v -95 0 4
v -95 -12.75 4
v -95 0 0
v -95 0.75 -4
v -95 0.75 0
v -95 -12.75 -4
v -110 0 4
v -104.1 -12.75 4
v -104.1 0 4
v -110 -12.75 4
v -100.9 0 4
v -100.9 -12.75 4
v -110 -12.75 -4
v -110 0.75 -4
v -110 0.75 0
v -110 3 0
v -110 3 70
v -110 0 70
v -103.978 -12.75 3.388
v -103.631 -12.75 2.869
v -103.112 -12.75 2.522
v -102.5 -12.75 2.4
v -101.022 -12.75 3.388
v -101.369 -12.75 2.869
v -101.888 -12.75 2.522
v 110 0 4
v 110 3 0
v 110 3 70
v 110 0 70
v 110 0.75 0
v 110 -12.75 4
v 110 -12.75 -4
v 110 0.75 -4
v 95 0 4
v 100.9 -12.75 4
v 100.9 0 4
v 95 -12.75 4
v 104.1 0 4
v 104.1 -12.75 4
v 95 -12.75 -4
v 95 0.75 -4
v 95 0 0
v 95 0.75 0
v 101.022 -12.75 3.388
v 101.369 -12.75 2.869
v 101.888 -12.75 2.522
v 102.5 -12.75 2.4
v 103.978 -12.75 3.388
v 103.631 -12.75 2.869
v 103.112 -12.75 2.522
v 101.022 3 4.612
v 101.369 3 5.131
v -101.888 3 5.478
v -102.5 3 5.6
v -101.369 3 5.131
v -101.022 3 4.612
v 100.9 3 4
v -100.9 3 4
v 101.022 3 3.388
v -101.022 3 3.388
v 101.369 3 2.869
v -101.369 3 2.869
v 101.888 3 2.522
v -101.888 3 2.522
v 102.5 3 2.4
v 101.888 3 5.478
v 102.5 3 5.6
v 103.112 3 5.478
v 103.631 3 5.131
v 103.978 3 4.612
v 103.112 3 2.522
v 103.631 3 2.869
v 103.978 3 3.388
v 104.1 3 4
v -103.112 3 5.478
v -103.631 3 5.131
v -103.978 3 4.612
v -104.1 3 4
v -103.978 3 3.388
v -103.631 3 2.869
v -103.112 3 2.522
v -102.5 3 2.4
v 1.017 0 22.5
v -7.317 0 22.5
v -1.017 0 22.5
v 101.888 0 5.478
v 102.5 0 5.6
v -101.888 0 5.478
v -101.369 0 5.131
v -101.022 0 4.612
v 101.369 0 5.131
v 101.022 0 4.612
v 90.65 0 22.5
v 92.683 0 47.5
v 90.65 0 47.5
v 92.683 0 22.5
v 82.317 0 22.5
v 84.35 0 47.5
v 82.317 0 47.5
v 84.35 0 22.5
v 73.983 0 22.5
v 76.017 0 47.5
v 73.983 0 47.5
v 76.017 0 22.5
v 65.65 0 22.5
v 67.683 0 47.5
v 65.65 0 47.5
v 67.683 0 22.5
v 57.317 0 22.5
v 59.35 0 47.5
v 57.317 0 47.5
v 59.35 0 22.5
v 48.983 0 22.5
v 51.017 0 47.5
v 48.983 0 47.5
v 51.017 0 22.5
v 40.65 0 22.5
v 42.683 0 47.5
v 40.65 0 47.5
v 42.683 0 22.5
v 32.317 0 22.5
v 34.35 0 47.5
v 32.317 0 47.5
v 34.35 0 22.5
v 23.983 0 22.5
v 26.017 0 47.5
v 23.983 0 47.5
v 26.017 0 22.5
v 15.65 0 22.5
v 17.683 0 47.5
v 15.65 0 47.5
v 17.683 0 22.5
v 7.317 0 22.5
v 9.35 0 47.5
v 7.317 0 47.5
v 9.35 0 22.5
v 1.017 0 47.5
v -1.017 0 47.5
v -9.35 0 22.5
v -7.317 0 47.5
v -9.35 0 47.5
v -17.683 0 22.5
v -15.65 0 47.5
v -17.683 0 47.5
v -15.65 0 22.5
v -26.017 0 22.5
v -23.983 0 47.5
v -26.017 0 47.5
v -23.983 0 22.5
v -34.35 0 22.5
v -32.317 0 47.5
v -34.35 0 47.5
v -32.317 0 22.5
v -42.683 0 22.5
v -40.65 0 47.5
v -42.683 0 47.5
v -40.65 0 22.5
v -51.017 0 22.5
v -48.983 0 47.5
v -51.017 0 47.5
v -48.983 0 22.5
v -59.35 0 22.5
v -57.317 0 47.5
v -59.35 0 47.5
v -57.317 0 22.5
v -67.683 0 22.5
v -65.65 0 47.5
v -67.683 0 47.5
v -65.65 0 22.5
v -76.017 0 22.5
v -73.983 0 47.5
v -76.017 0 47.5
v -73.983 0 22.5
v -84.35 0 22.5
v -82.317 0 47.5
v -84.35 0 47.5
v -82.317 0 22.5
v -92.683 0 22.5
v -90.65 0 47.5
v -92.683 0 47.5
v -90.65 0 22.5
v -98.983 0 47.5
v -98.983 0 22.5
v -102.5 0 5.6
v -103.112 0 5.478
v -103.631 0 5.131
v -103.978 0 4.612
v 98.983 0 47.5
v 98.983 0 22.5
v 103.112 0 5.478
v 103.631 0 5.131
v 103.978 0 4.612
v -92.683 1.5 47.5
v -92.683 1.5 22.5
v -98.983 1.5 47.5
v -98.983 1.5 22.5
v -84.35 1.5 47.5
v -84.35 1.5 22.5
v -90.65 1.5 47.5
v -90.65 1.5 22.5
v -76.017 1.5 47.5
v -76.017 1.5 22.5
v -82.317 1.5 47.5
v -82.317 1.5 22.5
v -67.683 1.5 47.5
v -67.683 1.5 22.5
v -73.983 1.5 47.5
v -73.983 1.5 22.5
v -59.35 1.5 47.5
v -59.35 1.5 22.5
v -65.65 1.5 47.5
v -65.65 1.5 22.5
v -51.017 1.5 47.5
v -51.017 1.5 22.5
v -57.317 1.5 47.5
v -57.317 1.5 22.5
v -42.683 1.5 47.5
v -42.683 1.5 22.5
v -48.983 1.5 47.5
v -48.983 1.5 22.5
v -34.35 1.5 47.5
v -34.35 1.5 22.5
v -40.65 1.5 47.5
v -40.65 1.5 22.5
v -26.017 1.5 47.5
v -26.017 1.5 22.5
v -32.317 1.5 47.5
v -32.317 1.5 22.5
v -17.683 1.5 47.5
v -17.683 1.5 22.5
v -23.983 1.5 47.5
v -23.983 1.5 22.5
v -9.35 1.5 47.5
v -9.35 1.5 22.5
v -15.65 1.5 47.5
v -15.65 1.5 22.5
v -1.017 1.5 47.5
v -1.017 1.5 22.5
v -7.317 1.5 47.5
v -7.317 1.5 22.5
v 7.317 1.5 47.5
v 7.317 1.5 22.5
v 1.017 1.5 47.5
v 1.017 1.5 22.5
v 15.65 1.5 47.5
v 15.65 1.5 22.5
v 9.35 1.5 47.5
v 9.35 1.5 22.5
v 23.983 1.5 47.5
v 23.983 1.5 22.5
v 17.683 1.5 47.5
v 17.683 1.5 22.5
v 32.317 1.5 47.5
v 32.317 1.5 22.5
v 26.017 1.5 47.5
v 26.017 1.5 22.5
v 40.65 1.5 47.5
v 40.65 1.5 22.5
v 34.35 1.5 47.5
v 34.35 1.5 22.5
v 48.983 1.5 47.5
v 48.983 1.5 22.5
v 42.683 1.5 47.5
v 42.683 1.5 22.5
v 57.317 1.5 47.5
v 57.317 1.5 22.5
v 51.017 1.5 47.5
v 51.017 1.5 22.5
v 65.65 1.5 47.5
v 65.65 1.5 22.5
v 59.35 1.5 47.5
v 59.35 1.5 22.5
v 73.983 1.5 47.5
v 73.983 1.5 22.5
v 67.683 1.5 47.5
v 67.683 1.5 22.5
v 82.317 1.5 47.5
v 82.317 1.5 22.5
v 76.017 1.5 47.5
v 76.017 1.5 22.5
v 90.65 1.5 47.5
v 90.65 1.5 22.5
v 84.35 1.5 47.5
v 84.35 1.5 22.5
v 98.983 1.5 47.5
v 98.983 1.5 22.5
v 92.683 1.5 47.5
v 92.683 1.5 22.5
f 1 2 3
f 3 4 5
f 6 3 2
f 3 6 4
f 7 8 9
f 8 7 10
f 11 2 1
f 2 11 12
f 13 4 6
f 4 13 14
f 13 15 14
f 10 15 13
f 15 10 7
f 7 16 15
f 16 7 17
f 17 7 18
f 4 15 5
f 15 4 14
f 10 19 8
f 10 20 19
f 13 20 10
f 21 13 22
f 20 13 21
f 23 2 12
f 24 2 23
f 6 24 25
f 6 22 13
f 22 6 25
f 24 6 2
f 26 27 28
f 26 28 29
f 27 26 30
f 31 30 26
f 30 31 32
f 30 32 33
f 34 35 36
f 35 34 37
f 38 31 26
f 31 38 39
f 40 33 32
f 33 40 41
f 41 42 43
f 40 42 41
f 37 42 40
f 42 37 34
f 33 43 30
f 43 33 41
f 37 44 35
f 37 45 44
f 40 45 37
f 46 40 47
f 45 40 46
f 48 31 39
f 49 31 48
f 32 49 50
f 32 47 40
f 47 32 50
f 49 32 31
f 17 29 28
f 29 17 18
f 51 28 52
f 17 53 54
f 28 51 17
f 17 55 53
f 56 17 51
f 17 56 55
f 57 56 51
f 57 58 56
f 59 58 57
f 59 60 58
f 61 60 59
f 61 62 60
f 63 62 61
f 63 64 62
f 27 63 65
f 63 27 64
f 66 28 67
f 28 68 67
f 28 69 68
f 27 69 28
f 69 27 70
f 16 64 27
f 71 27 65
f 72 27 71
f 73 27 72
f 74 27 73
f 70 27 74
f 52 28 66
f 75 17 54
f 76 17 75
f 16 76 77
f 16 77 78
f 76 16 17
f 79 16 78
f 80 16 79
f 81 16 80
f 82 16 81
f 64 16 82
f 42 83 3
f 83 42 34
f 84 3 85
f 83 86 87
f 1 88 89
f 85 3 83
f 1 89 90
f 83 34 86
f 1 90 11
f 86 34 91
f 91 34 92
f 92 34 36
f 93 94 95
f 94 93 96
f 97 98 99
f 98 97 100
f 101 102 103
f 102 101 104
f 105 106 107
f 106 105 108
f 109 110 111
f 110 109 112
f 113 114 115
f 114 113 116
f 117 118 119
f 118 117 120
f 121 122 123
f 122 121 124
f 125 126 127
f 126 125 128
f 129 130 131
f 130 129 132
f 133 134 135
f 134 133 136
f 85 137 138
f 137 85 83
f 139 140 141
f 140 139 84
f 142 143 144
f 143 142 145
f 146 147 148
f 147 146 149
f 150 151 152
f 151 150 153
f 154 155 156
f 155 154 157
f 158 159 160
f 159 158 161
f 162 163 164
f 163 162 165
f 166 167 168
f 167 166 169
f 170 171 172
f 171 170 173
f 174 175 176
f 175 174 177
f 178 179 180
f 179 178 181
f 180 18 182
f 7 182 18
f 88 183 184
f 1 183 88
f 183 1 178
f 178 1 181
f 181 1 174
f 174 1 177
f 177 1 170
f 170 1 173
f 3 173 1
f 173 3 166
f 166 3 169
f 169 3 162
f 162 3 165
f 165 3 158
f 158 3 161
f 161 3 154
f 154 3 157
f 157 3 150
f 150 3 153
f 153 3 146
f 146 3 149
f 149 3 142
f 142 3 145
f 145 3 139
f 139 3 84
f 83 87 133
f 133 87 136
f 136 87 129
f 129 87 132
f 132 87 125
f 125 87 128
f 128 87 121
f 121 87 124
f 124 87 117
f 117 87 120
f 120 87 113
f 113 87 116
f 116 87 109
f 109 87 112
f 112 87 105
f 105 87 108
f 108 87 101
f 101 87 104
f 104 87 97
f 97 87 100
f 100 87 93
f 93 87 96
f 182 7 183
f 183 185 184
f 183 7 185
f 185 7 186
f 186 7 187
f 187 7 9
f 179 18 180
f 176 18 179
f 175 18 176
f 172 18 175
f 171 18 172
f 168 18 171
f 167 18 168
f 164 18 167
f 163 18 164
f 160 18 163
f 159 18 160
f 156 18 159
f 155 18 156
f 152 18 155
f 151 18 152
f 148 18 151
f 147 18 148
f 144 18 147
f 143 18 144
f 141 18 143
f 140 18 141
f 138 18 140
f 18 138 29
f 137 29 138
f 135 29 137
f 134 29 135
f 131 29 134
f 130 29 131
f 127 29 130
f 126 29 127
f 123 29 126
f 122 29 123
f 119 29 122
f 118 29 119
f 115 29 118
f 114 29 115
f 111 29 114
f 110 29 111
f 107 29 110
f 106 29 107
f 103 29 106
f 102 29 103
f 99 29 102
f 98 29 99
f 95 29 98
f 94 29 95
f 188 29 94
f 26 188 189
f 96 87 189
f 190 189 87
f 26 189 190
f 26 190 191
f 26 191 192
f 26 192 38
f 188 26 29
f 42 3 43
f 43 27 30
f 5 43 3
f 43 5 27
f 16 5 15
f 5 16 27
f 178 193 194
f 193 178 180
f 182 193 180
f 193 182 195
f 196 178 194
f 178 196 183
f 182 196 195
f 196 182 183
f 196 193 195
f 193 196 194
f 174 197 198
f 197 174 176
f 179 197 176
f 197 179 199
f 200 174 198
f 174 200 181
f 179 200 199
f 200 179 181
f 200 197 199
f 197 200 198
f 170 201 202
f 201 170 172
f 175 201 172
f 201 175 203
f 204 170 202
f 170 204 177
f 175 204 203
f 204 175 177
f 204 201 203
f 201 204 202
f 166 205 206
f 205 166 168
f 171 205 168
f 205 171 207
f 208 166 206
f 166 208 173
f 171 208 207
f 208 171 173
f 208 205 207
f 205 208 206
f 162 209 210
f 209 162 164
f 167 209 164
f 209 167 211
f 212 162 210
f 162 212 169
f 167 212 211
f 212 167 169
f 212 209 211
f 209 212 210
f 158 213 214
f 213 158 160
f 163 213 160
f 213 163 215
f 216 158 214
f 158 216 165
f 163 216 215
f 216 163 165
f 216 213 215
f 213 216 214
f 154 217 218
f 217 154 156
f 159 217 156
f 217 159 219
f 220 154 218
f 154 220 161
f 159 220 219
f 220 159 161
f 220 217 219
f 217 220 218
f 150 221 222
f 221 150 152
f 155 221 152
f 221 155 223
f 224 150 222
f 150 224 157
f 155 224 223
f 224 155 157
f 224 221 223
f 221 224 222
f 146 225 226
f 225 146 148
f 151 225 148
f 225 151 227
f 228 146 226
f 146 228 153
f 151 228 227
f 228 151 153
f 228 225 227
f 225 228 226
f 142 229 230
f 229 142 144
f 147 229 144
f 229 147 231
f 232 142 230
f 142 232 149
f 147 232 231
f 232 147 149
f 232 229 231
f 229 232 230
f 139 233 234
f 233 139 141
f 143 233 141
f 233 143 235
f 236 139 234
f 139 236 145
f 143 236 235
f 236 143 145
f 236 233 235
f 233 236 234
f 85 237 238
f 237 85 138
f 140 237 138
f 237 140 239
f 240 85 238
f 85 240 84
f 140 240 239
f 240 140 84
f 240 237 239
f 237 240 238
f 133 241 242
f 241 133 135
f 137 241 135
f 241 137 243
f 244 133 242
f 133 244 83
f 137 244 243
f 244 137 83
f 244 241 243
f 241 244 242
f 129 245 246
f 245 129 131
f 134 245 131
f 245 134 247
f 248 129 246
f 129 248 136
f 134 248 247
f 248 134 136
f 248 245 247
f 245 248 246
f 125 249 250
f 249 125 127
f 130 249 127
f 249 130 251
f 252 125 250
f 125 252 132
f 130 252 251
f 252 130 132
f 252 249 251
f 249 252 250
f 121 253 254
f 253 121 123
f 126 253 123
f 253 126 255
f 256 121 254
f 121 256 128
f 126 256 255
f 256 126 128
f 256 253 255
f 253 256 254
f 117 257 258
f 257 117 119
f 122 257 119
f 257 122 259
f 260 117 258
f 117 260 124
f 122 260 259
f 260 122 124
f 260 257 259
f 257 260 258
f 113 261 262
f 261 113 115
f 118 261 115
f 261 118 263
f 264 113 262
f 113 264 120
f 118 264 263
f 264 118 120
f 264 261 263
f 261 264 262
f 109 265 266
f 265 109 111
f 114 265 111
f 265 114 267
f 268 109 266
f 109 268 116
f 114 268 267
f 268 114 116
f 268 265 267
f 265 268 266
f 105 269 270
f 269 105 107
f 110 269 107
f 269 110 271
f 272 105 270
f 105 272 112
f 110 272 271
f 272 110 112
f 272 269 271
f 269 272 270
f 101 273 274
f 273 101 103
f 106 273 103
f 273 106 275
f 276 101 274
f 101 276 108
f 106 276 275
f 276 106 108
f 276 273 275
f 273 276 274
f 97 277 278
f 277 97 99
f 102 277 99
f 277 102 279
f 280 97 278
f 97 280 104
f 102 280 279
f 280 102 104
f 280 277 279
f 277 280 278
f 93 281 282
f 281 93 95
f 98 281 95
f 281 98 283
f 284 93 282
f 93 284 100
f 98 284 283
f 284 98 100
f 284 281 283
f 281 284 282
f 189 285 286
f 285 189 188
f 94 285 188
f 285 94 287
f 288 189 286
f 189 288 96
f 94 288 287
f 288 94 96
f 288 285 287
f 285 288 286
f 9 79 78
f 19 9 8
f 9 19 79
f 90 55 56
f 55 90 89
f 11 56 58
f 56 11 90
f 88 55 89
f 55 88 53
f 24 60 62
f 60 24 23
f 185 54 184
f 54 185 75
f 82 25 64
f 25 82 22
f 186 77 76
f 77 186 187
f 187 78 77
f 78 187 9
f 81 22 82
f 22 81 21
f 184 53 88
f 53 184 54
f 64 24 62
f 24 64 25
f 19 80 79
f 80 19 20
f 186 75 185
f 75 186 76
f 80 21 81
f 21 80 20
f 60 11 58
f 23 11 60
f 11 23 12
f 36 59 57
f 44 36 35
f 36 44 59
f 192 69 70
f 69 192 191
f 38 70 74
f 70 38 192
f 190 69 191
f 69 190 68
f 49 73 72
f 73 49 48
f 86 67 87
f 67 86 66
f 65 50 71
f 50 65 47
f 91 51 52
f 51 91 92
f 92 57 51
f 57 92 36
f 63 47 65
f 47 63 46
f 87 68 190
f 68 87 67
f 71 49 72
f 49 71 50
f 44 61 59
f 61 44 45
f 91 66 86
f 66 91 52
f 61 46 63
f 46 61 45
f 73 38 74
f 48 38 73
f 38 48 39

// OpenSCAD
// file: ../common.scad
/*
 * WAVE OCEAN V10 - TWISTED CAM SYSTEM
 * COMMON PARAMETERS
 *
 * Simplified mechanism: slats rest on cam surface, no follower arms
 * Single helical ridge creates traveling wave as cam rotates
 *
 * All dimensions in mm
 */

// ============================================
// PRINT TOLERANCES (tune for your printer)
// ============================================

TOL_CLEARANCE = 0.2;         // Shaft in hole clearance
TOL_PRESS_FIT = -0.15;       // Bearing press-fit interference
TOL_SLIDING = 0.3;           // Sliding fit (slats in guides)

// ============================================
// HARDWARE - BEARINGS
// ============================================

// 608 bearing (main shaft) - common, cheap
BEARING_608_ID = 8;
BEARING_608_OD = 22;
BEARING_608_H = 7;

// ============================================
// HARDWARE - FASTENERS
// ============================================

M3_HOLE = 3.2;
M3_HEAD_DIA = 5.5;
M3_HEAD_H = 3;
M4_HOLE = 4.2;

// ============================================
// MAIN SHAFT
// ============================================

SHAFT_DIA = 8;                   // 8mm steel rod
SHAFT_LENGTH = 260;              // Total shaft length
SHAFT_HOLE = SHAFT_DIA + TOL_CLEARANCE;  // 8.2mm

// ============================================
// TWISTED CAM DIMENSIONS
// ============================================

CAM_LENGTH = 200;                // Active wave zone
CAM_CORE_RADIUS = 12;            // Base cylinder radius
CAM_RIDGE_HEIGHT = 10;           // How much ridge sticks out
CAM_RIDGE_WIDTH = 8;             // Width of ridge (smoothness)
CAM_MAX_RADIUS = CAM_CORE_RADIUS + CAM_RIDGE_HEIGHT;  // 22mm

// Helix parameters
HELIX_TURNS = 2;                 // Number of complete spirals
HELIX_PITCH = CAM_LENGTH / HELIX_TURNS;  // 100mm per turn

// ============================================
// SLAT DIMENSIONS
// ============================================

NUM_SLATS = 24;
SLAT_SPACING = CAM_LENGTH / NUM_SLATS;  // 8.33mm

SLAT_WIDTH = 6;                  // X dimension (along cam axis)
SLAT_DEPTH = 30;                 // Y dimension (front to back)
SLAT_HEIGHT = 50;                // Z dimension (wave visual height)

// Slat bottom - curved to nest on cam surface
SLAT_CURVE_RADIUS = CAM_CORE_RADIUS + 2;  // Slightly larger than core

// Wave motion
WAVE_AMPLITUDE = CAM_RIDGE_HEIGHT;  // Total Z travel = ridge height

// ============================================
// GUIDE RAIL DIMENSIONS
// ============================================

// Minimal guides - thin vertical slots, barely visible
GUIDE_LENGTH = CAM_LENGTH + 20;  // 220mm
GUIDE_HEIGHT = WAVE_AMPLITUDE + SLAT_HEIGHT + 10;  // 70mm
GUIDE_THICKNESS = 3;             // Very thin - minimal visual impact
GUIDE_WALL = 2;

SLOT_WIDTH = SLAT_WIDTH + TOL_SLIDING;  // 6.3mm
SLOT_HEIGHT = WAVE_AMPLITUDE + 15;       // 25mm vertical travel

// ============================================
// BEARING BLOCK DIMENSIONS
// ============================================

BB_WIDTH = 30;
BB_DEPTH = 30;
BB_HEIGHT = CAM_MAX_RADIUS + 8;  // 30mm - cam clears base

BEARING_POCKET_DIA = BEARING_608_OD - TOL_PRESS_FIT;  // 22.15mm press fit
BEARING_POCKET_DEPTH = BEARING_608_H + 0.5;           // 7.5mm

// ============================================
// BASE PLATE DIMENSIONS
// ============================================

BASE_LENGTH = CAM_LENGTH + 60;   // 260mm
BASE_WIDTH = SLAT_DEPTH + 40;    // 70mm
BASE_THICKNESS = 5;

// ============================================
// ASSEMBLY POSITIONS
// ============================================

// Cam center Z (shaft axis height above base)
CAM_CENTER_Z = BASE_THICKNESS + BB_HEIGHT;  // 35mm

// Bearing blocks X positions
BB_LEFT_X = -CAM_LENGTH/2 - BB_WIDTH/2 - 5;   // -120mm
BB_RIGHT_X = CAM_LENGTH/2 + BB_WIDTH/2 + 5;   // +120mm

// Guide rails Y positions (front and back of slats)
GUIDE_FRONT_Y = -SLAT_DEPTH/2 - GUIDE_THICKNESS - 1;  // -17mm
GUIDE_BACK_Y = SLAT_DEPTH/2 + 1;                       // +16mm

// Guide rails Z position (bottom of guide)
GUIDE_Z = CAM_CENTER_Z + CAM_MAX_RADIUS - 5;  // 52mm

// ============================================
// COLORS
// ============================================

C_CAM = [0.7, 0.5, 0.25];        // Wood brown
C_SLAT = [0.15, 0.35, 0.6];      // Ocean blue
C_GUIDE = [0.3, 0.3, 0.35, 0.5]; // Dark gray, semi-transparent
C_BB = [0.35, 0.35, 0.4];        // Bearing block gray
C_BASE = [0.25, 0.25, 0.3];      // Dark base
C_SHAFT = [0.6, 0.6, 0.65];      // Steel

// ============================================
// HELPER FUNCTIONS
// ============================================

// Helix phase at position X along cam (0-360 per turn)
function helix_phase(x) = ((x + CAM_LENGTH/2) / CAM_LENGTH) * 360 * HELIX_TURNS;

// Cam surface height at position X, given cam rotation angle theta
// Returns how far the ridge sticks up at that X position
function ridge_height(x, theta) =
    let(phase = helix_phase(x) + theta)
    let(ridge = CAM_RIDGE_HEIGHT * max(0, cos(phase - 90)))
    ridge;

// Total cam radius at position X, angle theta
function cam_radius(x, theta) = CAM_CORE_RADIUS + ridge_height(x, theta);

// Slat X position (evenly spaced)
function slat_x(i) = i * SLAT_SPACING - CAM_LENGTH/2 + SLAT_SPACING/2;

// Slat Z position (bottom of slat rests on cam surface)
function slat_z(i, theta) =
    let(x = slat_x(i))
    CAM_CENTER_Z + cam_radius(x, theta);

// ============================================
// QUALITY
// ============================================

$fn = 48;

// ============================================
// VERIFICATION
// ============================================

echo("=== TWISTED CAM SYSTEM ===");
echo(str("Cam length: ", CAM_LENGTH, "mm"));
echo(str("Cam radius: ", CAM_CORE_RADIUS, "-", CAM_MAX_RADIUS, "mm"));
echo(str("Ridge height (wave amplitude): ", CAM_RIDGE_HEIGHT, "mm"));
echo(str("Helix turns: ", HELIX_TURNS));
echo(str("Slats: ", NUM_SLATS, " @ ", SLAT_SPACING, "mm spacing"));
echo(str("Slat gap: ", SLAT_SPACING - SLAT_WIDTH, "mm"));
// main file
/*
 * GUIDE RAIL - Minimal Vertical Slot Guide
 *
 * Printable part: 2x (front and back)
 * Print orientation: Flat on side
 *
 * Features:
 * - Very thin profile to minimize visual impact
 * - 24 vertical slots for slats to slide in
 * - Mounting tabs at ends
 * - Designed to be nearly invisible when viewing waves
 */

include <../common.scad>

$fn = 32;

// ============================================
// MAIN GUIDE RAIL MODULE
// ============================================

module guide_rail() {
    difference() {
        union() {
            // Main rail body
            rail_body();

            // Mounting tabs at ends
            mounting_tabs();
        }

        // Vertical slots for slats
        slat_slots();

        // Mounting screw holes
        mounting_holes();
    }
}

// ============================================
// RAIL BODY
// ============================================

module rail_body() {
    // Very thin bar with rounded edges
    translate([-GUIDE_LENGTH/2, 0, 0])
    hull() {
        translate([0, 0, 0])
            cube([GUIDE_LENGTH, GUIDE_THICKNESS, 1]);
        translate([0, 0, GUIDE_HEIGHT - 1])
            cube([GUIDE_LENGTH, GUIDE_THICKNESS, 1]);
    }
}

// ============================================
// MOUNTING TABS
// ============================================

module mounting_tabs() {
    tab_width = 15;
    tab_depth = 12;
    tab_height = 8;

    for (x_sign = [-1, 1]) {
        translate([x_sign * (GUIDE_LENGTH/2 - tab_width/2), -tab_depth/2, 0])
            cube([tab_width, tab_depth + GUIDE_THICKNESS/2, tab_height], center = true);
    }
}

// ============================================
// SLAT SLOTS
// ============================================

module slat_slots() {
    // Vertical slots that slats slide through
    // Sized for SLAT_WIDTH + tolerance

    for (i = [0 : NUM_SLATS - 1]) {
        x = slat_x(i);

        // Through slot
        translate([x, -1, GUIDE_HEIGHT/2])
            cube([SLOT_WIDTH, GUIDE_THICKNESS + 2, SLOT_HEIGHT], center = true);
    }
}

// ============================================
// MOUNTING HOLES
// ============================================

module mounting_holes() {
    // M3 holes in tabs for attachment to uprights

    for (x_sign = [-1, 1]) {
        translate([x_sign * (GUIDE_LENGTH/2 - 7.5), 0, 4])
        rotate([90, 0, 0])
            cylinder(d = M3_HOLE, h = 30, center = true, $fn = 16);
    }
}

// ============================================
// RENDER
// ============================================

color(C_GUIDE)
guide_rail();

// ============================================
// INFO
// ============================================

echo("=== GUIDE RAIL ===");
echo(str("Length: ", GUIDE_LENGTH, "mm"));
echo(str("Height: ", GUIDE_HEIGHT, "mm"));
echo(str("Thickness: ", GUIDE_THICKNESS, "mm (minimal!)"));
echo(str("Slots: ", NUM_SLATS, " x ", SLOT_WIDTH, "mm"));
echo("");
echo("Print: 2x (front and back)");
echo("Orientation: Flat on side");
echo("Material: PLA or PETG");
